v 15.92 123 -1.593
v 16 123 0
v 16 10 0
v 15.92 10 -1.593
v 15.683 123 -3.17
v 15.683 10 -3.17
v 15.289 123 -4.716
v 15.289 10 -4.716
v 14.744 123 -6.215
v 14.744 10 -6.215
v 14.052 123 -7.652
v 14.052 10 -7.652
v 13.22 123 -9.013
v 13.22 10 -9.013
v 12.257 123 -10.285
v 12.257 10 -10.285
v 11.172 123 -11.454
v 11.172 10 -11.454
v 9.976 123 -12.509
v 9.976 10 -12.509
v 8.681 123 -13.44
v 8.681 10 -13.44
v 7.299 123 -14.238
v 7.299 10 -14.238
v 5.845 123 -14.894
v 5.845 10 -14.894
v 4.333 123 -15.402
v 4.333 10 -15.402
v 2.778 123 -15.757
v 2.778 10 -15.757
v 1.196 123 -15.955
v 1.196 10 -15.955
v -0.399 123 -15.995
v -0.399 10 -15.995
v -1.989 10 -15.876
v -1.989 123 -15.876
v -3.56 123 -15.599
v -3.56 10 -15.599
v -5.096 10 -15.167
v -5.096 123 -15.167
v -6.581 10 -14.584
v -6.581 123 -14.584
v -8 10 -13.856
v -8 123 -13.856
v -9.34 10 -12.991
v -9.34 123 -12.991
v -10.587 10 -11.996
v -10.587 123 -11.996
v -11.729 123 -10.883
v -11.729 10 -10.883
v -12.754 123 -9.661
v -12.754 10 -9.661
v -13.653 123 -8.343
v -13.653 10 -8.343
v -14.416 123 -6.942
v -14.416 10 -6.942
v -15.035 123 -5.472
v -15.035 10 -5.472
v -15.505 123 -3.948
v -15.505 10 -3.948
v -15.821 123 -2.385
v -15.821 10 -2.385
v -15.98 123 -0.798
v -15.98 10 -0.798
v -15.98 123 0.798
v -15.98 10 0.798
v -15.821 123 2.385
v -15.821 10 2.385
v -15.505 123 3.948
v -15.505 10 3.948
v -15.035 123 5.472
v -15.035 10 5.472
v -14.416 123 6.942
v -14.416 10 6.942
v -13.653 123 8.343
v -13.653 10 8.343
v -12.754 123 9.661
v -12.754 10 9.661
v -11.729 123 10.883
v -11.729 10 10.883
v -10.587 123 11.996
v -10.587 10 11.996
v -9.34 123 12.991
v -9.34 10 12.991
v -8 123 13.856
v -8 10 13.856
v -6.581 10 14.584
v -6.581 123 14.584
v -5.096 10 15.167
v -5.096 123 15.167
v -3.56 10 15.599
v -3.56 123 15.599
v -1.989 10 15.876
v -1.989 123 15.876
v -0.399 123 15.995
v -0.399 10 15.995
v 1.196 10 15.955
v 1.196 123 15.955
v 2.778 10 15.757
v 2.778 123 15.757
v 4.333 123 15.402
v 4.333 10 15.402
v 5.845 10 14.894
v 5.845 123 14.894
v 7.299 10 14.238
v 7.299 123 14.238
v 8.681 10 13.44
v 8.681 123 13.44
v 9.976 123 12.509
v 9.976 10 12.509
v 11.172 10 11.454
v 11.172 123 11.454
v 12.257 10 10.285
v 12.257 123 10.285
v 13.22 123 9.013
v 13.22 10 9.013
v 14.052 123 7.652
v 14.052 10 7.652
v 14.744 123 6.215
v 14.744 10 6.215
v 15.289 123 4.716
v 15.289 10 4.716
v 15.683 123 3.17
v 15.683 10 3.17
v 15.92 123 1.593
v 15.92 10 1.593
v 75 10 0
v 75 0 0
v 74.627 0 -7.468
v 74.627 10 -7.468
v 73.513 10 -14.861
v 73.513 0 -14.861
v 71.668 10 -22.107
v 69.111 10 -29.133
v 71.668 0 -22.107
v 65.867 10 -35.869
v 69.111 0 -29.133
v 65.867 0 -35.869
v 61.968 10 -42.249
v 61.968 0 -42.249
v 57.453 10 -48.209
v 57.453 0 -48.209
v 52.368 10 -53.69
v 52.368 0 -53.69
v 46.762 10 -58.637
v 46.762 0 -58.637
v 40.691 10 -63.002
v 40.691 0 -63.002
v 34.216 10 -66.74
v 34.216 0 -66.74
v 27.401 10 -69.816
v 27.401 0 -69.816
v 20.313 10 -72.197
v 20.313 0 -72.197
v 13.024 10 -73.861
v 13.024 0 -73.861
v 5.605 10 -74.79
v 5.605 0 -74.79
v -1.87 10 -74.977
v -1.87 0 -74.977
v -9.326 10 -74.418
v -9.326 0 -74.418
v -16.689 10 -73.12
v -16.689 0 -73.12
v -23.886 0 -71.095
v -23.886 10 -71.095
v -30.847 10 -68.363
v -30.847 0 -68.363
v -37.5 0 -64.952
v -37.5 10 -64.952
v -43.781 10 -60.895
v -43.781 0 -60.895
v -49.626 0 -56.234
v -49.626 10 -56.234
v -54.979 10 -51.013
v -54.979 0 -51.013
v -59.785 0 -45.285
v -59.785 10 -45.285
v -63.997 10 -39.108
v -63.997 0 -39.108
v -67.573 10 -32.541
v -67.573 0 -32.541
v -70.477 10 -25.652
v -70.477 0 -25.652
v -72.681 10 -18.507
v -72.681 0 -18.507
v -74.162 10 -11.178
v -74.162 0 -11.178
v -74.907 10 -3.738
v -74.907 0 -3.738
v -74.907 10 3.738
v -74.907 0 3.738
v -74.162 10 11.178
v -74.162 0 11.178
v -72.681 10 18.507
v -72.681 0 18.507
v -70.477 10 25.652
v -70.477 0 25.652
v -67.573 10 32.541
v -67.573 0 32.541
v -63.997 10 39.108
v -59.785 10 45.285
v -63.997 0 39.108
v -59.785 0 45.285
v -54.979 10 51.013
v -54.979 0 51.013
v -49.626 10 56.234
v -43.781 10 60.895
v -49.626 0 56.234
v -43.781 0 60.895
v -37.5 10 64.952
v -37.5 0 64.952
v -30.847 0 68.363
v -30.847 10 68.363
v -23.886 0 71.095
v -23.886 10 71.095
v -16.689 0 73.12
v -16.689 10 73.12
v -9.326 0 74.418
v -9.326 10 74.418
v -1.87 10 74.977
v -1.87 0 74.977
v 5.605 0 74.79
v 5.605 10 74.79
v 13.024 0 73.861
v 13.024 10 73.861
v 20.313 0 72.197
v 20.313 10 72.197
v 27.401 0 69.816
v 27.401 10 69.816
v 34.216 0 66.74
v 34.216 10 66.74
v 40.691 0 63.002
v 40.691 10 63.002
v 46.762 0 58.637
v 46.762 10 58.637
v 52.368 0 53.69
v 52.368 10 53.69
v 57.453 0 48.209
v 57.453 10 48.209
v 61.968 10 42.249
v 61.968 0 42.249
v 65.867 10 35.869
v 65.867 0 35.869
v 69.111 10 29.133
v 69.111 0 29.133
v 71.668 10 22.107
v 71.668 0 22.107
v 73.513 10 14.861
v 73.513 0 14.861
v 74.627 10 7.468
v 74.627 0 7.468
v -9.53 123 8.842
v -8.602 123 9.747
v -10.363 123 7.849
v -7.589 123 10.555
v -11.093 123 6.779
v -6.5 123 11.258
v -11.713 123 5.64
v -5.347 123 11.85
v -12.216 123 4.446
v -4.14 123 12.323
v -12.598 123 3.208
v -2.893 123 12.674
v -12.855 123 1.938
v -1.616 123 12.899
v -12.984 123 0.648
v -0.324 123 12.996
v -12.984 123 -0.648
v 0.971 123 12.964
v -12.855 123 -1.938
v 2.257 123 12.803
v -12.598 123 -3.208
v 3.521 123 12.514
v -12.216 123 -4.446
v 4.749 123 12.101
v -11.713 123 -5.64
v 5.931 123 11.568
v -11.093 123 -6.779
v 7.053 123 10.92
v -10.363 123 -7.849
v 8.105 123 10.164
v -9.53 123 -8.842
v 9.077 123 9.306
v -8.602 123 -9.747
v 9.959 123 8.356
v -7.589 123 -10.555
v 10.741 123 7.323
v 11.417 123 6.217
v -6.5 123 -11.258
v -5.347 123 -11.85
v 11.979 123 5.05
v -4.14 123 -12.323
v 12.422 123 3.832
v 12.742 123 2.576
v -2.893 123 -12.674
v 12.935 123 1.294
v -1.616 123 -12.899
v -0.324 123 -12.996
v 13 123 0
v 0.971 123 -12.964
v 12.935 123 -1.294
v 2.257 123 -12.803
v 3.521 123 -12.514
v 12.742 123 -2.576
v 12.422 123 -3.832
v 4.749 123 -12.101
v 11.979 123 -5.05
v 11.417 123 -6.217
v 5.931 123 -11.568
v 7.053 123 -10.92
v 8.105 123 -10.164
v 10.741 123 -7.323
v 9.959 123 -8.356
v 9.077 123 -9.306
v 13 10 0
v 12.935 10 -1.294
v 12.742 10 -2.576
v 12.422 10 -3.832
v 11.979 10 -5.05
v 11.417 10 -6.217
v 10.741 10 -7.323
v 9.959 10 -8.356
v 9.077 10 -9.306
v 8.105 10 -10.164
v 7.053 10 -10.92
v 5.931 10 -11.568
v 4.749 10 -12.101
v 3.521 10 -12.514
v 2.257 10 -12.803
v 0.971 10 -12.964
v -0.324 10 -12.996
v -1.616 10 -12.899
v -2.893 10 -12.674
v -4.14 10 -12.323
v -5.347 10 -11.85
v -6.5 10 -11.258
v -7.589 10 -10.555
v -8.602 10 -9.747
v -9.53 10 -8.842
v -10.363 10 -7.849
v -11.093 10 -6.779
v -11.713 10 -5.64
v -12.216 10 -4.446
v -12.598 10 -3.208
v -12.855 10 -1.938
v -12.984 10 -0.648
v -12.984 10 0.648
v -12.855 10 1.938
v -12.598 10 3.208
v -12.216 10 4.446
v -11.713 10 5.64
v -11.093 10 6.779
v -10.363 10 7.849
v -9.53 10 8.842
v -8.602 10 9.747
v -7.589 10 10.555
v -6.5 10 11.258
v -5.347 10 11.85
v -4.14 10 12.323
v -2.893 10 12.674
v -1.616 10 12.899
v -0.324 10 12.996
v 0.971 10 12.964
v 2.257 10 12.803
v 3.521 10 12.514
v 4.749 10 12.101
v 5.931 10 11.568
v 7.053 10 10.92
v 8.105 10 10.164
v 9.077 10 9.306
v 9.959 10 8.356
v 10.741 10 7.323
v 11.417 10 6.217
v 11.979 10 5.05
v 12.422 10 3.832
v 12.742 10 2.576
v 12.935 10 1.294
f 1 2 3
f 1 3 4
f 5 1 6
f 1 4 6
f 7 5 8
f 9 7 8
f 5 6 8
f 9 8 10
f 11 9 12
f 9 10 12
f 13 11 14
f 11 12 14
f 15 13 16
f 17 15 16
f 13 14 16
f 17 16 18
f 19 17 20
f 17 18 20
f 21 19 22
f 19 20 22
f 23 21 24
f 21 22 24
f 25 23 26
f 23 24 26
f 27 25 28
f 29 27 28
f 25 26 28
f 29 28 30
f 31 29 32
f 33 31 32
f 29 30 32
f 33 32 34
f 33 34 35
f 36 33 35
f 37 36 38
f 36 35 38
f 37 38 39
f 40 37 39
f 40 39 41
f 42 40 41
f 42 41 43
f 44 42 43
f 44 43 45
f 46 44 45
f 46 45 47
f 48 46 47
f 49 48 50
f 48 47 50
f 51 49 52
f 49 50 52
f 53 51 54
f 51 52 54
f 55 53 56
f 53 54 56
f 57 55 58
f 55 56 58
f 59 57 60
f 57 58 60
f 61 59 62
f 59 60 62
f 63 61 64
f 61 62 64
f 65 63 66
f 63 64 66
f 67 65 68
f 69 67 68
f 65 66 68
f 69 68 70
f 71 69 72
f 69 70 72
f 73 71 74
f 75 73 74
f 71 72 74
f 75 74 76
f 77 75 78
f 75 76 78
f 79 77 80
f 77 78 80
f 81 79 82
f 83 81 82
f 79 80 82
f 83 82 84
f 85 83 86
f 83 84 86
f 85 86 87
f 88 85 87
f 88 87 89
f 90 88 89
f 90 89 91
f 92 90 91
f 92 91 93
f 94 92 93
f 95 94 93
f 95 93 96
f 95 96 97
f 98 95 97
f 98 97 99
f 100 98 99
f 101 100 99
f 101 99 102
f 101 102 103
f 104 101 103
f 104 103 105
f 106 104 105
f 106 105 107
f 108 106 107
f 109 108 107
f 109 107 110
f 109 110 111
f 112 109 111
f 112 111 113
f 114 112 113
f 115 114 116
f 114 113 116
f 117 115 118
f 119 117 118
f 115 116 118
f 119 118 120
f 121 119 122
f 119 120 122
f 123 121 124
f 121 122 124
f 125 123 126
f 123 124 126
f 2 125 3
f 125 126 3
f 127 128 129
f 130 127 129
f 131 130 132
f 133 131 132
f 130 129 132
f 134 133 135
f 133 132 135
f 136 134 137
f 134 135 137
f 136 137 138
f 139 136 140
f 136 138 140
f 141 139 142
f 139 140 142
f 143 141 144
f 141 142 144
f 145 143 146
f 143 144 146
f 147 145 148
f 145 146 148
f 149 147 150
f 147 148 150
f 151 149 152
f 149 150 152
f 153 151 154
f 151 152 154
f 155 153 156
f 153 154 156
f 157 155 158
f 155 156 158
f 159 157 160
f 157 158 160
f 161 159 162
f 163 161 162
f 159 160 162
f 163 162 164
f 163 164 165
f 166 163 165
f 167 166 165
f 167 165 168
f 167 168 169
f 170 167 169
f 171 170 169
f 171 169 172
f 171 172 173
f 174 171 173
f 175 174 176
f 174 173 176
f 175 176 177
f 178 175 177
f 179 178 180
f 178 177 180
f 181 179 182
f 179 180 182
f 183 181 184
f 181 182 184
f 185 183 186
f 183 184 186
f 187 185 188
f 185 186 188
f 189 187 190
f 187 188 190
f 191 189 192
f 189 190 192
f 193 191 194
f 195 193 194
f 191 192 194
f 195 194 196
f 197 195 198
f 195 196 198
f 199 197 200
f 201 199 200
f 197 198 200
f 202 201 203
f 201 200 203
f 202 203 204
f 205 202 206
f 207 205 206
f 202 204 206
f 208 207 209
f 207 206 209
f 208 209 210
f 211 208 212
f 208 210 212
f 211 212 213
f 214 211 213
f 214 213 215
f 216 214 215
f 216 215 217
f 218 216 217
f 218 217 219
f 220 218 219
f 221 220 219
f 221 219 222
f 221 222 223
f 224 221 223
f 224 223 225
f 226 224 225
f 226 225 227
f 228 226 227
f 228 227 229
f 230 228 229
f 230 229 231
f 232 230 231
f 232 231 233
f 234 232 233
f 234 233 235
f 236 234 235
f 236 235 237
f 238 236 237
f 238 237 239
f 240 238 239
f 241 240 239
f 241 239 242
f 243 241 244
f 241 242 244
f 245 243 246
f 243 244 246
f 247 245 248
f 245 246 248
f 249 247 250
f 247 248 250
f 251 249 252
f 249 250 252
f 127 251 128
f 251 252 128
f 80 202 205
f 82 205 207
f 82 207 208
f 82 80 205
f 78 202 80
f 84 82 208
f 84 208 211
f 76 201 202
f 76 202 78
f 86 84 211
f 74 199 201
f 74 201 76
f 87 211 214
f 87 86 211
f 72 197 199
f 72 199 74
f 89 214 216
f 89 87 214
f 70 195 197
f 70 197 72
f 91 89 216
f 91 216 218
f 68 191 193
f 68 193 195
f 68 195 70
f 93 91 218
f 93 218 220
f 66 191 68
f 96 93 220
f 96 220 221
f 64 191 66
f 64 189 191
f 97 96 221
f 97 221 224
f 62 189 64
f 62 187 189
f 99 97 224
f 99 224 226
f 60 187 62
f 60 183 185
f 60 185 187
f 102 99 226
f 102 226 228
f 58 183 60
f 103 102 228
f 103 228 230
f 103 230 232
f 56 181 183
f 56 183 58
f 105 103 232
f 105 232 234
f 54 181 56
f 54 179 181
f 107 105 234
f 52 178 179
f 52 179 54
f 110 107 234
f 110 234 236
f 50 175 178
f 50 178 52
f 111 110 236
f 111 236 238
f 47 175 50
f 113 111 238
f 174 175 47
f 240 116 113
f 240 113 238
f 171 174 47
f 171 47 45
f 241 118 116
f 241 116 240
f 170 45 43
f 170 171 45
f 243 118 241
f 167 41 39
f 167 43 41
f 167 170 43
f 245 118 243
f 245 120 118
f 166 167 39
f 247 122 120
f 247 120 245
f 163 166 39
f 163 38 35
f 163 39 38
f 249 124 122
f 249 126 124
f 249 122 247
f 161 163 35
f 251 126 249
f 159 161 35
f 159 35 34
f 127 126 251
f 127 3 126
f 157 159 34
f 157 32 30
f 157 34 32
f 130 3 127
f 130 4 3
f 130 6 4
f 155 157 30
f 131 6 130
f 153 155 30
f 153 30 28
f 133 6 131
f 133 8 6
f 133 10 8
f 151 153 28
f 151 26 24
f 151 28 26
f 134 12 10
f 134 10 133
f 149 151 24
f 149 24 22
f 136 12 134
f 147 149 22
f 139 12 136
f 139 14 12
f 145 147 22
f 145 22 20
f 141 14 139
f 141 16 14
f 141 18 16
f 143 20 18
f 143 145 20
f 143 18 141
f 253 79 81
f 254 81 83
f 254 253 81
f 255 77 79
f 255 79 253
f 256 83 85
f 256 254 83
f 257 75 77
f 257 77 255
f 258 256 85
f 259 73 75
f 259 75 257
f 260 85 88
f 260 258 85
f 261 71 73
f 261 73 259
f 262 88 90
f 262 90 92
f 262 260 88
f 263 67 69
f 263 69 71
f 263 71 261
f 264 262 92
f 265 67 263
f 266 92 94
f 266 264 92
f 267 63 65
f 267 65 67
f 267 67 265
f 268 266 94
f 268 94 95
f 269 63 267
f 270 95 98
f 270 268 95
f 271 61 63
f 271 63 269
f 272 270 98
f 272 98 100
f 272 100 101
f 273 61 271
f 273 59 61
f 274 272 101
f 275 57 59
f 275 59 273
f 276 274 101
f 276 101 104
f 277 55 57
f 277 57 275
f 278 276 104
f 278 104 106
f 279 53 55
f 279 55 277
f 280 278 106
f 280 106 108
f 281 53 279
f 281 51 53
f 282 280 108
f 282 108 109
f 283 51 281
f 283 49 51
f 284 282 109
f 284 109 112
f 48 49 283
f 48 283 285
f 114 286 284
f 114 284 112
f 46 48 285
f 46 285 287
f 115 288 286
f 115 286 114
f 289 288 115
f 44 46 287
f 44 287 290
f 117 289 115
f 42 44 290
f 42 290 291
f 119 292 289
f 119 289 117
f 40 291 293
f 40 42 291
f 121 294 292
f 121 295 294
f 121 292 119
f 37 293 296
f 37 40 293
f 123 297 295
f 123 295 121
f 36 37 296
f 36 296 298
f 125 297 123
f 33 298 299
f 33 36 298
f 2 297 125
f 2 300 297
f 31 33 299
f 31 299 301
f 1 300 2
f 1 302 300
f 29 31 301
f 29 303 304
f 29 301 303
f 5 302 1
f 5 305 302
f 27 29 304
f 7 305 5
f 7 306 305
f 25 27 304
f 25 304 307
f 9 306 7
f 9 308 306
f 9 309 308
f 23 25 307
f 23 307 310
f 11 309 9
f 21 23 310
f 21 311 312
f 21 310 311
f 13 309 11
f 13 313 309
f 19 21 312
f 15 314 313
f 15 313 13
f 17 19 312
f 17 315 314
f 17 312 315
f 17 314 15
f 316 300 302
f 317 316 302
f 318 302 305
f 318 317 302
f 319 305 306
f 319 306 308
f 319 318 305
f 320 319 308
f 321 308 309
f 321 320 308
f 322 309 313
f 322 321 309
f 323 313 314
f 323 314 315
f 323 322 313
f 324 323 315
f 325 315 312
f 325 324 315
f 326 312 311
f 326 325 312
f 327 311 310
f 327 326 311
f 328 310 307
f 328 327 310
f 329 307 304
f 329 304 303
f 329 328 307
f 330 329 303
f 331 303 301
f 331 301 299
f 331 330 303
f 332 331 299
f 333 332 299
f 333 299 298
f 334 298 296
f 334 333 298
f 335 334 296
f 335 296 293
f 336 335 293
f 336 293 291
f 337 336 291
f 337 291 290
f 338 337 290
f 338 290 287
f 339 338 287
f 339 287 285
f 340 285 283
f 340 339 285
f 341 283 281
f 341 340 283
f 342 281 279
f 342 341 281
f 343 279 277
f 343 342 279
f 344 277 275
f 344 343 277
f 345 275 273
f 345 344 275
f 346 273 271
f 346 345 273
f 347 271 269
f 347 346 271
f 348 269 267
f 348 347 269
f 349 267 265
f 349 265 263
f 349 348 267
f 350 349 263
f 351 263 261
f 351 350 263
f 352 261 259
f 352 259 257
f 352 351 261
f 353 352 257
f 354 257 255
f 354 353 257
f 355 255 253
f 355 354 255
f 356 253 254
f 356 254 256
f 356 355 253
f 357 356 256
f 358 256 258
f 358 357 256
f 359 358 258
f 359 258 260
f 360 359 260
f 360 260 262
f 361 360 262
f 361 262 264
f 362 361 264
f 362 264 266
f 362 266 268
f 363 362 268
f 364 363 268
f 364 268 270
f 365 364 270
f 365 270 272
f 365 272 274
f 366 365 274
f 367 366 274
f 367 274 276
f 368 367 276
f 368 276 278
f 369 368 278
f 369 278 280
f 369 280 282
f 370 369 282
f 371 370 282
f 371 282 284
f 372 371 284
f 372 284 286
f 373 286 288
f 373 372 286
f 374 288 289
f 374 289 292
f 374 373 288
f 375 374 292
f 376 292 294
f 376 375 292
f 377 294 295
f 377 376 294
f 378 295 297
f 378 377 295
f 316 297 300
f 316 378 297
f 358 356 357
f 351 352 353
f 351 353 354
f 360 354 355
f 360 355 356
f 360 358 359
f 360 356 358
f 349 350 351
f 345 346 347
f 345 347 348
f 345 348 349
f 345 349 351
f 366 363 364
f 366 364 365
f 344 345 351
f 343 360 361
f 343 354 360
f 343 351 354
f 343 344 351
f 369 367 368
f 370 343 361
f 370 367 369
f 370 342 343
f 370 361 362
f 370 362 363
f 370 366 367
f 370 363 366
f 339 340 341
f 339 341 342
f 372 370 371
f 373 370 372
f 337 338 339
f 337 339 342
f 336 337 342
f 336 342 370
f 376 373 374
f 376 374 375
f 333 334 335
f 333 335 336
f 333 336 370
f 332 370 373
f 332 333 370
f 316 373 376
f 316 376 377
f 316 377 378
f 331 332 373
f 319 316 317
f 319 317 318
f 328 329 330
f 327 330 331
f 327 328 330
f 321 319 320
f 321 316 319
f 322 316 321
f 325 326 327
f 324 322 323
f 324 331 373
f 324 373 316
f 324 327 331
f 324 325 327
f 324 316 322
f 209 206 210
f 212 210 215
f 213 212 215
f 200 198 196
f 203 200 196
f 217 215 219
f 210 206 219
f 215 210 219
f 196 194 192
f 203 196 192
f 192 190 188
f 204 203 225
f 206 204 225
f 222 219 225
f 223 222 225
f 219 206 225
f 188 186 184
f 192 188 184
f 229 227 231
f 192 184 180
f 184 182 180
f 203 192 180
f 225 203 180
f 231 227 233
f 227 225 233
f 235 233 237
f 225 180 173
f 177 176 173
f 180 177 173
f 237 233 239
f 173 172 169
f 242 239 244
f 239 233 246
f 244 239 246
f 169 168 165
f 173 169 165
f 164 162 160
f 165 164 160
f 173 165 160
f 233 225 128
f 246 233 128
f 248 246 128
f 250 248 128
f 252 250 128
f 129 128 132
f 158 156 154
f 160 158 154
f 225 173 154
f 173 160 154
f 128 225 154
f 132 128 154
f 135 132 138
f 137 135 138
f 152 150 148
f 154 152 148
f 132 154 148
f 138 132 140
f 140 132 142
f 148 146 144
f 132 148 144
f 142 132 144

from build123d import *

# Parameters (mm, degrees)
SKETCH1_R           = 75
BOSS_EXTRUDE1_DEPTH = 10
SKETCH2_R           = 16
SKETCH2_R_2         = 13
BOSS_EXTRUDE2_DEPTH = 113


with BuildPart() as part:
    # Sketch1 → Boss-Extrude1 (new body)
    with BuildSketch(Plane(origin=(0, 0, 0), x_dir=(1, 0, 0), z_dir=(0, 1, 0))):
        Circle(SKETCH1_R)
    extrude(amount=BOSS_EXTRUDE1_DEPTH)

    # Sketch2 → Boss-Extrude2 (add)
    with BuildSketch(Plane(origin=(0, 10, 0), x_dir=(1, 0, 0), z_dir=(0, 1, 0))):
        Circle(SKETCH2_R)
        Circle(SKETCH2_R_2, mode=Mode.SUBTRACT)
    extrude(amount=BOSS_EXTRUDE2_DEPTH)


solid = part.part
